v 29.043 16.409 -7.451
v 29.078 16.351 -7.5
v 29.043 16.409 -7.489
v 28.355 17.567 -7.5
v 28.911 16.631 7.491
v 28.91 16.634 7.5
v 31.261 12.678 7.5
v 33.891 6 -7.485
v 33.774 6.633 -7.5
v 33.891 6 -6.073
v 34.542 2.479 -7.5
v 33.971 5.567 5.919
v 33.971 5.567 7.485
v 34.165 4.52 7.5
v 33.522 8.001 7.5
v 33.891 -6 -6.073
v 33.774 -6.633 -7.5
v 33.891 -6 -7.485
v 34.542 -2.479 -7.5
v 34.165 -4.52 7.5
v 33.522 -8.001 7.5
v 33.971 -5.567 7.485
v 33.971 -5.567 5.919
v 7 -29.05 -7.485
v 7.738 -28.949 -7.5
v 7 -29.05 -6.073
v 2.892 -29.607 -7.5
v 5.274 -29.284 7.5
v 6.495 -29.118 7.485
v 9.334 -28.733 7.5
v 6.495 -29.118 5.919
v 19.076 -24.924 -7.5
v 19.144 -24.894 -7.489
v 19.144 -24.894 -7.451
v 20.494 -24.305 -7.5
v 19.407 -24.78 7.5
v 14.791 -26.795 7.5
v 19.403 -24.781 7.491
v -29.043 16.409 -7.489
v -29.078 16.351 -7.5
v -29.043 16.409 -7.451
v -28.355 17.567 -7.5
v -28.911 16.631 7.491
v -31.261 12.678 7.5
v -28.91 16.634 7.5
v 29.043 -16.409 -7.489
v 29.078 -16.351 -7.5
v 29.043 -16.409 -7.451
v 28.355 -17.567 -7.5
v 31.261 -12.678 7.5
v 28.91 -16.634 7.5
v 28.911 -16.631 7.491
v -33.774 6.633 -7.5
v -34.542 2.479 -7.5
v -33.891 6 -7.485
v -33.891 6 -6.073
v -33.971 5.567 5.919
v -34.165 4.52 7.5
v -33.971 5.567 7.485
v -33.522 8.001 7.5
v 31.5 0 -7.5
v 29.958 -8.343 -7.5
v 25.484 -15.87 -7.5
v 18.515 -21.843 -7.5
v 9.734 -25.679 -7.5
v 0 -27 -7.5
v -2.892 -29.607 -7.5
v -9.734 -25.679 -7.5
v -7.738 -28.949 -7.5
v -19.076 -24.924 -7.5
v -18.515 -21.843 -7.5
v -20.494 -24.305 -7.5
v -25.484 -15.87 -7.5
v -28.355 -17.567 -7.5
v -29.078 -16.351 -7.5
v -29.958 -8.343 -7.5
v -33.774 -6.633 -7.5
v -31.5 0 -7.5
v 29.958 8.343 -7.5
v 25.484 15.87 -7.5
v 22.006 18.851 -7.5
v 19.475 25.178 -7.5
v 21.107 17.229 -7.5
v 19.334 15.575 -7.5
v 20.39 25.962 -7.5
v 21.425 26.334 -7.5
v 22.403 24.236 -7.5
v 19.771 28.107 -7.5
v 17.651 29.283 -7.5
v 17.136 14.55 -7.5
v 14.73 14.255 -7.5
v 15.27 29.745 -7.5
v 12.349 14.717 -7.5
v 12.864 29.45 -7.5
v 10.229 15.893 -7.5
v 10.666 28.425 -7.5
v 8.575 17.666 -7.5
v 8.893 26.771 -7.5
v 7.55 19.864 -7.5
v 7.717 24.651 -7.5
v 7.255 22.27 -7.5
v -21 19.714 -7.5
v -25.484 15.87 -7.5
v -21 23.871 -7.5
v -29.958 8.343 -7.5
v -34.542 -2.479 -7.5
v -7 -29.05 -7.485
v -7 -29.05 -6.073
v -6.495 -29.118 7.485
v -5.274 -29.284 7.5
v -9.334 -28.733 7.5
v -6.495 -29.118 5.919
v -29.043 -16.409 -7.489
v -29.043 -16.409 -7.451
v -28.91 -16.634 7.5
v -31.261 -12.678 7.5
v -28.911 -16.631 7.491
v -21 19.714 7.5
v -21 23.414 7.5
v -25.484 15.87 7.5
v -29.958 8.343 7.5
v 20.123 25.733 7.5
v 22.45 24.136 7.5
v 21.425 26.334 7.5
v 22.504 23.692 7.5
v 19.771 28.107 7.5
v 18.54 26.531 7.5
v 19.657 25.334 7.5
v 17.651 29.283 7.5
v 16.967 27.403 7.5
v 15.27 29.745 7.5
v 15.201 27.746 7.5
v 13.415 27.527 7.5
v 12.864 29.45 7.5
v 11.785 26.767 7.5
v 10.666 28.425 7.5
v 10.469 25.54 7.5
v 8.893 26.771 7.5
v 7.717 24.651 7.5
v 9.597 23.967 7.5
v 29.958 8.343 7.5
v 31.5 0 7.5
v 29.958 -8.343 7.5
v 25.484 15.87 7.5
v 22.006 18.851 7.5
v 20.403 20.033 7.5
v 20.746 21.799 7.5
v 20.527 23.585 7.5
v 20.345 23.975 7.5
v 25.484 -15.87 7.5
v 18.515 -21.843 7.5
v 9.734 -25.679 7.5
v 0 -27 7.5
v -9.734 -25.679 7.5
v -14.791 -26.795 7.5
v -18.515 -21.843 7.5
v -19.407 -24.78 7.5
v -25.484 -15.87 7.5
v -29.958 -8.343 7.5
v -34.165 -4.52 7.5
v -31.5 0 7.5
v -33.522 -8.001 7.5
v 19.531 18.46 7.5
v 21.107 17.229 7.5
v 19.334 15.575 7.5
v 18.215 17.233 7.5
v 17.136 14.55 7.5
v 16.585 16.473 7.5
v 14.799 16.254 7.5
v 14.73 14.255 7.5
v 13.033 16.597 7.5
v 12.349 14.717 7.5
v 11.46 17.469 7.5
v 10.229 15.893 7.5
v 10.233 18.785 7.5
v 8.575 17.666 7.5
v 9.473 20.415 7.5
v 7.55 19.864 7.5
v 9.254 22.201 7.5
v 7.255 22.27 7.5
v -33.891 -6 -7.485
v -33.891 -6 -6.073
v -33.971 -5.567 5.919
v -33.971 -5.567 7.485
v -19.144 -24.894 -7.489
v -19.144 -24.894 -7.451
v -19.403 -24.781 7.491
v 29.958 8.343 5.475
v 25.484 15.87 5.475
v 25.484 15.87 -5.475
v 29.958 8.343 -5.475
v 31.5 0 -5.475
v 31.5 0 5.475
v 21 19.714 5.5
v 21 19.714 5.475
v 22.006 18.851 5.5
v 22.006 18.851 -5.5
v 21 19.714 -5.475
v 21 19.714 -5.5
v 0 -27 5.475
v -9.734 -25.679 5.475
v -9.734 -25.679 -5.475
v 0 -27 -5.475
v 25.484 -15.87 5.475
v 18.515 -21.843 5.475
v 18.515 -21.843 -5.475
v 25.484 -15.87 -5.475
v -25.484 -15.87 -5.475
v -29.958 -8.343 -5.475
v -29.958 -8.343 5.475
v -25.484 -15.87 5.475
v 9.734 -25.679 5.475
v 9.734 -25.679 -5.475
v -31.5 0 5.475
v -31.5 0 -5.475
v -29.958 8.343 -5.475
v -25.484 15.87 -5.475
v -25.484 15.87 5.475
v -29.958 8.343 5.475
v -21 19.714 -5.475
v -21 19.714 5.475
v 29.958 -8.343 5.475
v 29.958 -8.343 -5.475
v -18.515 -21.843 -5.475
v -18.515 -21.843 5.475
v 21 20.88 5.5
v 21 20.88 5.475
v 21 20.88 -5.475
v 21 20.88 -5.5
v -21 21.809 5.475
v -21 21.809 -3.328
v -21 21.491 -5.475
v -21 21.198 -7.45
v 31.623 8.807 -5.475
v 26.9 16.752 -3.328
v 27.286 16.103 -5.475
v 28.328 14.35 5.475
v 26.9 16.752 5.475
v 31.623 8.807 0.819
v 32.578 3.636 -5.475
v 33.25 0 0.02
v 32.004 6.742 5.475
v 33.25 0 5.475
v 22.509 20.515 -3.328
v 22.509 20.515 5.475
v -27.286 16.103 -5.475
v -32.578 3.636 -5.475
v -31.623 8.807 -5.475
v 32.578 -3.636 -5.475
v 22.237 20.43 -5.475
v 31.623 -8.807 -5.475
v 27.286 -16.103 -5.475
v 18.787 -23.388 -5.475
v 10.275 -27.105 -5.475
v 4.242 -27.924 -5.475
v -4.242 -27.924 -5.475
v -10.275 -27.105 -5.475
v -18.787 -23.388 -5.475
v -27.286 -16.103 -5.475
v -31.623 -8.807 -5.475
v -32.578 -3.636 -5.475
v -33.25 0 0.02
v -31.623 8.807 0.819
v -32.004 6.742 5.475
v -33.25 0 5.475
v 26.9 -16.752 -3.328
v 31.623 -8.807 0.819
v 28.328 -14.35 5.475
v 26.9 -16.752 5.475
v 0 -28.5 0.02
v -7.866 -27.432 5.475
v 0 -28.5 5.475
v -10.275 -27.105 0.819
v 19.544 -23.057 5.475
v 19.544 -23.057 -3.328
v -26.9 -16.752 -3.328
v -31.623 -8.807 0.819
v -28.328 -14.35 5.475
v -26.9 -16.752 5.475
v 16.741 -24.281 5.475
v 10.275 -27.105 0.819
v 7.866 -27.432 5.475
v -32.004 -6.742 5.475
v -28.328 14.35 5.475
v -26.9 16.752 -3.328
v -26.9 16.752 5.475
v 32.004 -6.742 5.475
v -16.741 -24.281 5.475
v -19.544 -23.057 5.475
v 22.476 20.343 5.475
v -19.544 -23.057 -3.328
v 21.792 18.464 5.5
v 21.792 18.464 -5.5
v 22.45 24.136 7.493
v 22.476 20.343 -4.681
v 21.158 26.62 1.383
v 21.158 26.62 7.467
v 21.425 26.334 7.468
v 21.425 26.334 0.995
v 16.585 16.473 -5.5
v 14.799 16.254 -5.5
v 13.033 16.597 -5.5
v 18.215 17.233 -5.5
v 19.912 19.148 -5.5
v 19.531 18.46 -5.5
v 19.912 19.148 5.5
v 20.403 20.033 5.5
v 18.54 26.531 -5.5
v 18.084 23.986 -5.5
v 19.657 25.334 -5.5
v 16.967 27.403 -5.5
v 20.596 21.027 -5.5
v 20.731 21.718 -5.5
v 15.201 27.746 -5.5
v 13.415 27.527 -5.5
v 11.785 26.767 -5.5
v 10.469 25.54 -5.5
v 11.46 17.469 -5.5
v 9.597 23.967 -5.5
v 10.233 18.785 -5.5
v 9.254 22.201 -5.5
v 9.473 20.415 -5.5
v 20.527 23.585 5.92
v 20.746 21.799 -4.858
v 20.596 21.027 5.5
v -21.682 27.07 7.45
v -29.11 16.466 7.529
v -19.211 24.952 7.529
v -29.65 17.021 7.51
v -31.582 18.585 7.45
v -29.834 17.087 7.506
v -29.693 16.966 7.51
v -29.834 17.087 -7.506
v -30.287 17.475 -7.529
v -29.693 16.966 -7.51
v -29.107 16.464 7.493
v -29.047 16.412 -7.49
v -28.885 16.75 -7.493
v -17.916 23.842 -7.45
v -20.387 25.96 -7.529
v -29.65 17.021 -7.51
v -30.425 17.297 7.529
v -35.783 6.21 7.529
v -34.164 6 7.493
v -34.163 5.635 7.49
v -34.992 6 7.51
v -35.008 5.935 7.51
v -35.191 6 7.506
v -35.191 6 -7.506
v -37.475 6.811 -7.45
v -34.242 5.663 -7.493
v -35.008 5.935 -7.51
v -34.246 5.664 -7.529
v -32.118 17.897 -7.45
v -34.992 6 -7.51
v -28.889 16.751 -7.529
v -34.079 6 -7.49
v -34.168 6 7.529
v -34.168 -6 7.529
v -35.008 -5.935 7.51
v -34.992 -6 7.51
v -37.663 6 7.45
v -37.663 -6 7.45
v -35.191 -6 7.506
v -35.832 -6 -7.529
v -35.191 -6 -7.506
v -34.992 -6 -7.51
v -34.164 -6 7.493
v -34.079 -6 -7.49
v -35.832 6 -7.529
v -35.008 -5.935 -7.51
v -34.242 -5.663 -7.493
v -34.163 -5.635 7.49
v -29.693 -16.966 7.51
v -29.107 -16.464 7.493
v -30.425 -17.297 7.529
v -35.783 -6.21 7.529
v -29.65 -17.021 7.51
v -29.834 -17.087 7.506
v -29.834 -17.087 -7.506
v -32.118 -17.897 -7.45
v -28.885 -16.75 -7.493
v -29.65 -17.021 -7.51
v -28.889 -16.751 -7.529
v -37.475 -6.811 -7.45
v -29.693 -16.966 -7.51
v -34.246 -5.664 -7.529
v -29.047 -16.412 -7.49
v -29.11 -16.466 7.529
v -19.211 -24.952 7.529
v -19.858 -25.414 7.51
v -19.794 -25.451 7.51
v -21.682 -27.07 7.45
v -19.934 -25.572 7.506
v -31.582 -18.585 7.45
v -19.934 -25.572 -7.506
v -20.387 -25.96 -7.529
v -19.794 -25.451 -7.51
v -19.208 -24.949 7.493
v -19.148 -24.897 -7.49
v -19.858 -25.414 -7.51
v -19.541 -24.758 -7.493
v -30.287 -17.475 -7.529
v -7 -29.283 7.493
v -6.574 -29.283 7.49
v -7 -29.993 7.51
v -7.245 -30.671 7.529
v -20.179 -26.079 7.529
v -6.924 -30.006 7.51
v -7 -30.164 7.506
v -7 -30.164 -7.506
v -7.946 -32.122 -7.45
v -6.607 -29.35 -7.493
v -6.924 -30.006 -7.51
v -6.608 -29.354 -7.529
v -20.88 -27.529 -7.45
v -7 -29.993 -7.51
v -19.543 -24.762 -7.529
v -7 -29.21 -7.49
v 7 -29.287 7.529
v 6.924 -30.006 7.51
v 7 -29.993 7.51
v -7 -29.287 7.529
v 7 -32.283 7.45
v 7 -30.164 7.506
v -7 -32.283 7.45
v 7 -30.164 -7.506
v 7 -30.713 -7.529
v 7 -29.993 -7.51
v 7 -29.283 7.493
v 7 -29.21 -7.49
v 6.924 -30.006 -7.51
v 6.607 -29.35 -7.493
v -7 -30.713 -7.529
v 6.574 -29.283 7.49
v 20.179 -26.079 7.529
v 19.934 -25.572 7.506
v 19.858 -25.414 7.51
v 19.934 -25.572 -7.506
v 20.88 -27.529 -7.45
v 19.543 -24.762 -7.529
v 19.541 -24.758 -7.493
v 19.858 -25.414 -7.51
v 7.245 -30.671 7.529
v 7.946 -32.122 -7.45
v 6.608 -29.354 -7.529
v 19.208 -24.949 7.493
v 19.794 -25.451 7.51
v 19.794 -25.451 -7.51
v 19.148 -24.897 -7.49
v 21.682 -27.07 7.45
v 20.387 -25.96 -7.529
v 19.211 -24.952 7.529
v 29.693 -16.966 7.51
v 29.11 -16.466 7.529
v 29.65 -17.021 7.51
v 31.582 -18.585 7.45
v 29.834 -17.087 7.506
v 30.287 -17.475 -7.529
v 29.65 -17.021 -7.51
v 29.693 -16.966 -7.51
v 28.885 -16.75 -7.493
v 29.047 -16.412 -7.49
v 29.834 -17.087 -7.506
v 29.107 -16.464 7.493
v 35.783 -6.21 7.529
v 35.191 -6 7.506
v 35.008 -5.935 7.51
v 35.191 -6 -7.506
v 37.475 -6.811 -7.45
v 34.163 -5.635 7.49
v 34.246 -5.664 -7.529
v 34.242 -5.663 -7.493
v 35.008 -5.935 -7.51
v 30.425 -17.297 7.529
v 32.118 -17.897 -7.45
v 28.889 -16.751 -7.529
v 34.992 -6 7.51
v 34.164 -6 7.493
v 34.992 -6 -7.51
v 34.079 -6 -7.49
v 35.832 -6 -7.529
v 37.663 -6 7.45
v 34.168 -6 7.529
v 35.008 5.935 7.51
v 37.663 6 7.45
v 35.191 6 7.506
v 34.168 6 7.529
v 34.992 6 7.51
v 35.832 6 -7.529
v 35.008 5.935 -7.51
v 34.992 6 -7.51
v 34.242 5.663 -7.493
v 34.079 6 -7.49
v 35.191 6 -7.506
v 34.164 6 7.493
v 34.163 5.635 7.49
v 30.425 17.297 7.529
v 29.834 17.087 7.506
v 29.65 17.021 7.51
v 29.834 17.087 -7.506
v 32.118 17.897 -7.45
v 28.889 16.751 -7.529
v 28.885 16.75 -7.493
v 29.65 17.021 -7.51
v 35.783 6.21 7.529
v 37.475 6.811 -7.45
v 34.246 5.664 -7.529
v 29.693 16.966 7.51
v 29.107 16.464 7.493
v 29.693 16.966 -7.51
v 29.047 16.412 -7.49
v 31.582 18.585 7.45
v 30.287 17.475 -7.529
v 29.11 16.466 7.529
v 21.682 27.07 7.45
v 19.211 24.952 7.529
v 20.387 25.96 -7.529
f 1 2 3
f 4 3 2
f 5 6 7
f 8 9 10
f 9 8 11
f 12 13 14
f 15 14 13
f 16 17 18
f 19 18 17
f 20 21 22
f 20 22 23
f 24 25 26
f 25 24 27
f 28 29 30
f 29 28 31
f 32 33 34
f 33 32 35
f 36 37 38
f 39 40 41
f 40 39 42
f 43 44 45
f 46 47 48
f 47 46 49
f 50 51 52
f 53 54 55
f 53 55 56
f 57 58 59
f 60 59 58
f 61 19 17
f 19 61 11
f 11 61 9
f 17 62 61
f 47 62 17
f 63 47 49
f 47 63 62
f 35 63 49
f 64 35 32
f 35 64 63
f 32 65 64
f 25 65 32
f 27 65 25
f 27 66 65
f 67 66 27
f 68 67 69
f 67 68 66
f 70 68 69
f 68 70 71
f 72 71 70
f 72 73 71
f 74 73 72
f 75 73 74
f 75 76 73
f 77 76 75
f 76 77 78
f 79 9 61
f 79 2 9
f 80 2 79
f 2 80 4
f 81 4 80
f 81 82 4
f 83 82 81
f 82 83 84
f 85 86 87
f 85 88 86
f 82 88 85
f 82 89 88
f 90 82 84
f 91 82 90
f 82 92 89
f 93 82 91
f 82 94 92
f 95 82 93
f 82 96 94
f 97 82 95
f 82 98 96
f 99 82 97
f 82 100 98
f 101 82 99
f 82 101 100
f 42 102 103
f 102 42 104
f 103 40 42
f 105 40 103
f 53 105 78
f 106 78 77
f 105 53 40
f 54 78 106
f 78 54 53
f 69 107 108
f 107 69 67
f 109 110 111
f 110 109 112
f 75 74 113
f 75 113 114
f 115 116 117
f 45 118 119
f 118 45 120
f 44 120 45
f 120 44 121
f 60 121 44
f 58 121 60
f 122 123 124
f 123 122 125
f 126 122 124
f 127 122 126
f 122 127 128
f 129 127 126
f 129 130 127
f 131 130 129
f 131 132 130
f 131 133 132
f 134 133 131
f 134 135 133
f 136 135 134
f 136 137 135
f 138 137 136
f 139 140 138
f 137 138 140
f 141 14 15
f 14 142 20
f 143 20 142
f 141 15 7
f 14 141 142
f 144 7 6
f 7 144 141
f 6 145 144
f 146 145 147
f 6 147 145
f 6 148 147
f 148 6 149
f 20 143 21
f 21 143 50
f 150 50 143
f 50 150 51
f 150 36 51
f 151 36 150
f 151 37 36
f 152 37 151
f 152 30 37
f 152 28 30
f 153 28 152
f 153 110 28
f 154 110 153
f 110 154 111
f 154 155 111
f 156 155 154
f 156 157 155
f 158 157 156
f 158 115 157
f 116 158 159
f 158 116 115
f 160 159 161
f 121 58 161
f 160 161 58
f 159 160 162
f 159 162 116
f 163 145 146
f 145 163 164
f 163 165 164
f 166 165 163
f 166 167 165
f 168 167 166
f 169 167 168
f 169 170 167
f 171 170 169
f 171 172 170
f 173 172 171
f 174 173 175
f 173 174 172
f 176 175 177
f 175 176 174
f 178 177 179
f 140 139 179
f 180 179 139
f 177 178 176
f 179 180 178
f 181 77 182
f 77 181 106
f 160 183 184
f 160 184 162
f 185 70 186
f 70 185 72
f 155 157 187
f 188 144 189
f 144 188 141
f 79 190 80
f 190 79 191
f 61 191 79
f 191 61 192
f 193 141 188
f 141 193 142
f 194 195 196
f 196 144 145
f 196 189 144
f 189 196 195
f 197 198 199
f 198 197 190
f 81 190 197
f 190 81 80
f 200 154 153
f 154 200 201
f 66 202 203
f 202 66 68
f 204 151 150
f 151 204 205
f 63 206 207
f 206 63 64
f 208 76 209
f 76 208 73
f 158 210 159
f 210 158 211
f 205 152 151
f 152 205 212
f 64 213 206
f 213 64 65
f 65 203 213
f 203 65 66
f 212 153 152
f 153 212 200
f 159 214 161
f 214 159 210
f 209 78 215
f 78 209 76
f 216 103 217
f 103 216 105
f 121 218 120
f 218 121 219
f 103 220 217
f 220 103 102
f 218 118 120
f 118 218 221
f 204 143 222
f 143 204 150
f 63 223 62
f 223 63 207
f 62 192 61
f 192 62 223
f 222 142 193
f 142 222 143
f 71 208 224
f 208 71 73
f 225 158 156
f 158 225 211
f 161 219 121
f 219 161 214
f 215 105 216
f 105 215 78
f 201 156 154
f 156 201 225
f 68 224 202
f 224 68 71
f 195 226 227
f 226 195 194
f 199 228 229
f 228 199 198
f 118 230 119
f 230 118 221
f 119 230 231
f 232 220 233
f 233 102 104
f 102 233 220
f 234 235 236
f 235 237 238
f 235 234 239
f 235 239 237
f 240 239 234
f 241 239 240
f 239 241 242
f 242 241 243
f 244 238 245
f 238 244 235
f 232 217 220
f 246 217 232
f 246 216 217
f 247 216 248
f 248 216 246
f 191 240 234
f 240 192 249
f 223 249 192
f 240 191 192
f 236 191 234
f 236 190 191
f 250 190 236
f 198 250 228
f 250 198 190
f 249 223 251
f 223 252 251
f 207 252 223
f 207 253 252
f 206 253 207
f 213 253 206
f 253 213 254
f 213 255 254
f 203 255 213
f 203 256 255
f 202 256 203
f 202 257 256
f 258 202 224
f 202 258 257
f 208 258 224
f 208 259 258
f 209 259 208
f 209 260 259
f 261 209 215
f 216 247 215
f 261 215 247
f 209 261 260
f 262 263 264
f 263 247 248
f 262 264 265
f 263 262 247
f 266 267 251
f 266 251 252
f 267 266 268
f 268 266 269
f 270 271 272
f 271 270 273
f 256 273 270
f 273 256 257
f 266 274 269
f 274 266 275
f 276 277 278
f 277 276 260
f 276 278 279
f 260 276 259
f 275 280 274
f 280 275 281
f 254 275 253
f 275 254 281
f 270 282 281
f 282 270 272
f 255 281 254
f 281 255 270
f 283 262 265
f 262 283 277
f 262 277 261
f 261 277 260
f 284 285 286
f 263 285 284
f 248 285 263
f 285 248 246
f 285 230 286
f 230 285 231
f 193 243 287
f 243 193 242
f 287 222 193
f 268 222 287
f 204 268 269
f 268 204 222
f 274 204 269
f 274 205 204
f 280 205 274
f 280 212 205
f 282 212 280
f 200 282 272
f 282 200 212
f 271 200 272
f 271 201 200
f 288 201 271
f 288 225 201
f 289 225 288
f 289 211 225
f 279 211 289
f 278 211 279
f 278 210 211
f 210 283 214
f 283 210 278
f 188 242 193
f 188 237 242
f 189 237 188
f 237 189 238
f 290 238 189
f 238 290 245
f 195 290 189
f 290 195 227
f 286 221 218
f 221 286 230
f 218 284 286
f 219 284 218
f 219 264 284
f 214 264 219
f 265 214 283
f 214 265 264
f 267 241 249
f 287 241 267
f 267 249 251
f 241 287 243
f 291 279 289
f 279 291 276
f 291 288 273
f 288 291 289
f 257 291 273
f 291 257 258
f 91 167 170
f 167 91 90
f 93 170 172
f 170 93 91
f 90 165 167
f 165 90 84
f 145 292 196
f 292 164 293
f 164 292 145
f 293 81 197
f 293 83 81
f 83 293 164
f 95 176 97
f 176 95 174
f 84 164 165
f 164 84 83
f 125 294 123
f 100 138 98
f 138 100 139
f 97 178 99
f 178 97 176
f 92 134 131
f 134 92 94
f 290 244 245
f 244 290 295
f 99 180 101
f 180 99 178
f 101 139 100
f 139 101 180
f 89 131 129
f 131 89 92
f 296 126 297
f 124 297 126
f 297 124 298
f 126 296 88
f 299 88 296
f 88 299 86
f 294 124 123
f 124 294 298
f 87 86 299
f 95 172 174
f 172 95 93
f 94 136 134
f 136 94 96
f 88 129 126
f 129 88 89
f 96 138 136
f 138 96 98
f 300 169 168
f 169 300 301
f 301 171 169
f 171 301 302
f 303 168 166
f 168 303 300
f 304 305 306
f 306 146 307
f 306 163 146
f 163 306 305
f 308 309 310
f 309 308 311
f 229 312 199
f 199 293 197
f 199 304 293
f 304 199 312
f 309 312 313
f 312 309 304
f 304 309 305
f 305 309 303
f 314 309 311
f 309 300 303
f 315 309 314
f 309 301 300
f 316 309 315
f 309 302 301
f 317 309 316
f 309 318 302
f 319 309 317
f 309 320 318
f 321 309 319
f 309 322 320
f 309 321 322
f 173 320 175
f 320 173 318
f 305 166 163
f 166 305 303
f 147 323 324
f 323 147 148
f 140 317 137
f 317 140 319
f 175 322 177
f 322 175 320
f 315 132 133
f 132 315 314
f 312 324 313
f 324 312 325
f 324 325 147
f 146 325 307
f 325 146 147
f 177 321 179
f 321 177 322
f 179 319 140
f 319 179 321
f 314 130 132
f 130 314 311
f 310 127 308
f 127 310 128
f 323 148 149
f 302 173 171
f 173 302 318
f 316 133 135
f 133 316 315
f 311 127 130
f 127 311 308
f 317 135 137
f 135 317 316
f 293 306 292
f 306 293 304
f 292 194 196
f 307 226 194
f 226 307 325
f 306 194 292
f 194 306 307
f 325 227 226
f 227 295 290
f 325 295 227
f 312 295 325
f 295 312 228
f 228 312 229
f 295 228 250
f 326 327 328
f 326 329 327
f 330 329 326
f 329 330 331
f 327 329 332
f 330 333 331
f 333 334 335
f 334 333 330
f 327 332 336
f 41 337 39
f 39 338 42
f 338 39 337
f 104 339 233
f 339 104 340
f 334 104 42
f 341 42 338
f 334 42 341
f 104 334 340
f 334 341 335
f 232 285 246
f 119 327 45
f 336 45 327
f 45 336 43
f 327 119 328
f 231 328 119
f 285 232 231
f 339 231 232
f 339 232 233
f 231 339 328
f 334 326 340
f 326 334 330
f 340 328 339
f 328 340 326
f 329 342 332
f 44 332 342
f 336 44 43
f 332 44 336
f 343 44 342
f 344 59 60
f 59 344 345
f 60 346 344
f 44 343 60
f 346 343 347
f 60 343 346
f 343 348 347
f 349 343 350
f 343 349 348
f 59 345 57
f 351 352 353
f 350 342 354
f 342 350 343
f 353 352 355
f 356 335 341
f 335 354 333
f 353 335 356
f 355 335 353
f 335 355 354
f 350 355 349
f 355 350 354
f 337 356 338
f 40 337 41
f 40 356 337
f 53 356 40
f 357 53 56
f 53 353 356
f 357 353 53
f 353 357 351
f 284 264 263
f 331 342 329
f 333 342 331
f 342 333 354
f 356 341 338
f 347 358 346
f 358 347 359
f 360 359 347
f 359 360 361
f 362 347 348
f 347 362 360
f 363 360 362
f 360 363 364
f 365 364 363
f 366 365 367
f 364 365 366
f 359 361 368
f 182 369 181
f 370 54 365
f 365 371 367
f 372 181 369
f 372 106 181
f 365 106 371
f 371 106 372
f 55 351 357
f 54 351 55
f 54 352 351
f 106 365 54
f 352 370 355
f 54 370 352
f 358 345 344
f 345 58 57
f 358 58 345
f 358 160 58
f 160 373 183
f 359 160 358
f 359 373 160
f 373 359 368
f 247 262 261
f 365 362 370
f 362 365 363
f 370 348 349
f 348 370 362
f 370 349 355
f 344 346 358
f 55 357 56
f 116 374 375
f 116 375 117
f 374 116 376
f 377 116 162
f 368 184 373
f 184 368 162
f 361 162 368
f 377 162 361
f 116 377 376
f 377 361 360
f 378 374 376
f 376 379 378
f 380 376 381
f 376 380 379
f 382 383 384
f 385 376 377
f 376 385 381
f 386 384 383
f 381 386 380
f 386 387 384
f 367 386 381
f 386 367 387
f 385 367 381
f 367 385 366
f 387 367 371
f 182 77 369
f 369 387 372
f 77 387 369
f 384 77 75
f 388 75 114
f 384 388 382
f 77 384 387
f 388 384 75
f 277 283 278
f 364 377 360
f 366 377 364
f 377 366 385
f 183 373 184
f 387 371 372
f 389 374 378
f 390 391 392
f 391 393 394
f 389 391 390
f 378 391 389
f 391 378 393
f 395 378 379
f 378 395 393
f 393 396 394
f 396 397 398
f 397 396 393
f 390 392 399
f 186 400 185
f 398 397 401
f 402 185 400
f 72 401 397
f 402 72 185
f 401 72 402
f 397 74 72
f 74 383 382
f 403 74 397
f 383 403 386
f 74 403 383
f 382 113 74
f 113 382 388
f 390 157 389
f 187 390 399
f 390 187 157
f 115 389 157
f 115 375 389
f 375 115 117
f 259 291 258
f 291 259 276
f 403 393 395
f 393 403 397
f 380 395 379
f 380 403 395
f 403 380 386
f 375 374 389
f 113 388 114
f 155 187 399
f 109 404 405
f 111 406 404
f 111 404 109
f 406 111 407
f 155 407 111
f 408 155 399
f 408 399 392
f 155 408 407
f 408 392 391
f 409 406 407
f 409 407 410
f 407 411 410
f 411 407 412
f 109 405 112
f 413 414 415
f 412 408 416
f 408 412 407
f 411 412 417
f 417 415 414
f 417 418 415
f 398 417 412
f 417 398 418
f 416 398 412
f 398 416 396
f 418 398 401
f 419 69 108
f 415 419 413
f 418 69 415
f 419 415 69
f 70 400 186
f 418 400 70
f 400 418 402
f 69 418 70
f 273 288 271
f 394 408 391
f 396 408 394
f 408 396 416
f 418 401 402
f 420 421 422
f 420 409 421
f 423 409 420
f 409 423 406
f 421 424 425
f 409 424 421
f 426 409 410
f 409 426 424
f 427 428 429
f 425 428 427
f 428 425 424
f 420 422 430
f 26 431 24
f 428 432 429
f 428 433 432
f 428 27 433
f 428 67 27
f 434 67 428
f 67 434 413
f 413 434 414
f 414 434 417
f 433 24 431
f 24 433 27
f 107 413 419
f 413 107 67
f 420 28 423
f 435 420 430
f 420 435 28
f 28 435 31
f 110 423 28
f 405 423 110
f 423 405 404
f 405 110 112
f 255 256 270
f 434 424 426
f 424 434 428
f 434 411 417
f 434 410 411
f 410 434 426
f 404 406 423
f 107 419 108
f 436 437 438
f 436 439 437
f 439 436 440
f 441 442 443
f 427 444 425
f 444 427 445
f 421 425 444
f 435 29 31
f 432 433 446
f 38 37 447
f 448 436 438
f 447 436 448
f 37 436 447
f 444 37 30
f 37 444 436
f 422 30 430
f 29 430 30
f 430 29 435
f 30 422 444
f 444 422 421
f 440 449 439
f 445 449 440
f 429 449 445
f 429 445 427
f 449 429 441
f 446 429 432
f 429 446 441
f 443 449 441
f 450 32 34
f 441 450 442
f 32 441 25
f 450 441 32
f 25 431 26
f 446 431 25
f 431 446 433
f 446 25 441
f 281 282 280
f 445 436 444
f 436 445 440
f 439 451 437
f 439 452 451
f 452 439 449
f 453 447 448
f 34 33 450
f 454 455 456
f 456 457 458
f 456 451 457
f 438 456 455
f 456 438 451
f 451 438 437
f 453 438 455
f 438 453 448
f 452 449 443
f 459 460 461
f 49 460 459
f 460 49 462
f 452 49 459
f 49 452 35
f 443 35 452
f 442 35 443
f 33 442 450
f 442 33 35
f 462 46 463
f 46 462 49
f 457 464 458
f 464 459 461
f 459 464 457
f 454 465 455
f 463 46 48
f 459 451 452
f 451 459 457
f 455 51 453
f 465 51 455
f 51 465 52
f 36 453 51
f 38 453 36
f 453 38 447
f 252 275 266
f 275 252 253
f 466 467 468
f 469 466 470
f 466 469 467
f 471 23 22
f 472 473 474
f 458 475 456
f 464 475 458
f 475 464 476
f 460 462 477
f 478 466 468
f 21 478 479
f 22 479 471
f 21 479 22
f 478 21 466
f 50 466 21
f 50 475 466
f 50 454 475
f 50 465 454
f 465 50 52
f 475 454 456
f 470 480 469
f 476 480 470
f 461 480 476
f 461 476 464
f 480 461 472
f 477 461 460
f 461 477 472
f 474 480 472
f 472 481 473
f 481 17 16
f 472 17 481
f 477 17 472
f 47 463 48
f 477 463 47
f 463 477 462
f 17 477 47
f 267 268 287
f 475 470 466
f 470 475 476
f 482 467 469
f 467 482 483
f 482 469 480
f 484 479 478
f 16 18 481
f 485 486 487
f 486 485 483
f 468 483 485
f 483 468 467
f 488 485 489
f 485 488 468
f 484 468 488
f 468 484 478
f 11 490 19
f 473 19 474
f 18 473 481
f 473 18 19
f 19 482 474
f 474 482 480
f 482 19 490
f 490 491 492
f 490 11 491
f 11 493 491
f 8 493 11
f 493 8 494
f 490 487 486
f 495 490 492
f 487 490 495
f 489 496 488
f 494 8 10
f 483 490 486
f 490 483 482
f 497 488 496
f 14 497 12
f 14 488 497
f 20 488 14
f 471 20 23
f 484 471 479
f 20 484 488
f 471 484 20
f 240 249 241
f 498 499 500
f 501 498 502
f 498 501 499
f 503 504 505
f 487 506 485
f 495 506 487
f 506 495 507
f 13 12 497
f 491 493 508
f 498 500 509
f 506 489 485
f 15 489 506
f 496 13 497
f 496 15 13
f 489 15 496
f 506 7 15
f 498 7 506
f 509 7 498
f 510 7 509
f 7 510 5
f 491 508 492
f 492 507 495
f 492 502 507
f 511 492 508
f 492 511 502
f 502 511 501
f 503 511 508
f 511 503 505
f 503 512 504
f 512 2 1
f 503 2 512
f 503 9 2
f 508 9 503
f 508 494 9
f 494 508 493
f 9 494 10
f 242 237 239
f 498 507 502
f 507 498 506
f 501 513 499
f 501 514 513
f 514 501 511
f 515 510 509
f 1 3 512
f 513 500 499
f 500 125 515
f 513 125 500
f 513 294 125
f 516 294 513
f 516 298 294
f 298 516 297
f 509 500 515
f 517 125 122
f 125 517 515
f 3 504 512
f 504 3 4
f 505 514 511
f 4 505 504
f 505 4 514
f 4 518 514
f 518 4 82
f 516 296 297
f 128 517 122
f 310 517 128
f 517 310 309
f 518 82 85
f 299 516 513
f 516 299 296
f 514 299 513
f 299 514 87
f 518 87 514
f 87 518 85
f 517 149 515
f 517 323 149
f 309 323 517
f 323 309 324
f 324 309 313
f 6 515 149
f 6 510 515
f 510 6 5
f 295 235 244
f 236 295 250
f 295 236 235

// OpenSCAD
// file: simple.scad
include <../config.scad> 



/**/
scale([width/2,height/2,depth]){
    
    difference(){

        cylinder(h = 1, r1 = 1, r2 = 1, center=true){}

        cylinder(h = 1, r1 = (1-thinkness), r2 = 0.9, center=true){}

        translate([0,(1-(thinkness/2)),0]){
            cube([join,thinkness*10,1],true){}
        }
        
        cylinder(h = 0.73, r1 = (1-(thinkness/2)), r2 = (1-(thinkness/2)), center=true){}
    }
    
    
       

}

translate([15,22,0]){
    rotate([0,0,-110]){
        difference(){
            
            cylinder(h = depth, r1 = 11.5/2+2, r2 = 11.5/2+2, center=true){}
            
            translate([0,0,2]){
                cylinder(h = depth, r1 = 11.5/2, r2 = 11.5/2, center=true){}
            }
            
            translate([0,6,0]){
                cube([2,5,depth-4],true){}
            }
            
        }
    }
}





/**/
// file: ../config.scad
width = 70;
height = 60;
depth=15;

thinkness=.1;
join=1.2;


$fn=20;
// main file
include <../config.scad> 
include <./simple.scad> 

/**/
scale([width/2,height/2,depth]){
    for (i = [2:1:(360/22.5)-2]) {
        rotate([0,0,22.5*i]){
            translate([0,1,0]){
                rotate([i%2==1?3:-3,0,0]){
                    cube([.4,.1,1],true){}
                }
            }
        }
    }
}
/**/
